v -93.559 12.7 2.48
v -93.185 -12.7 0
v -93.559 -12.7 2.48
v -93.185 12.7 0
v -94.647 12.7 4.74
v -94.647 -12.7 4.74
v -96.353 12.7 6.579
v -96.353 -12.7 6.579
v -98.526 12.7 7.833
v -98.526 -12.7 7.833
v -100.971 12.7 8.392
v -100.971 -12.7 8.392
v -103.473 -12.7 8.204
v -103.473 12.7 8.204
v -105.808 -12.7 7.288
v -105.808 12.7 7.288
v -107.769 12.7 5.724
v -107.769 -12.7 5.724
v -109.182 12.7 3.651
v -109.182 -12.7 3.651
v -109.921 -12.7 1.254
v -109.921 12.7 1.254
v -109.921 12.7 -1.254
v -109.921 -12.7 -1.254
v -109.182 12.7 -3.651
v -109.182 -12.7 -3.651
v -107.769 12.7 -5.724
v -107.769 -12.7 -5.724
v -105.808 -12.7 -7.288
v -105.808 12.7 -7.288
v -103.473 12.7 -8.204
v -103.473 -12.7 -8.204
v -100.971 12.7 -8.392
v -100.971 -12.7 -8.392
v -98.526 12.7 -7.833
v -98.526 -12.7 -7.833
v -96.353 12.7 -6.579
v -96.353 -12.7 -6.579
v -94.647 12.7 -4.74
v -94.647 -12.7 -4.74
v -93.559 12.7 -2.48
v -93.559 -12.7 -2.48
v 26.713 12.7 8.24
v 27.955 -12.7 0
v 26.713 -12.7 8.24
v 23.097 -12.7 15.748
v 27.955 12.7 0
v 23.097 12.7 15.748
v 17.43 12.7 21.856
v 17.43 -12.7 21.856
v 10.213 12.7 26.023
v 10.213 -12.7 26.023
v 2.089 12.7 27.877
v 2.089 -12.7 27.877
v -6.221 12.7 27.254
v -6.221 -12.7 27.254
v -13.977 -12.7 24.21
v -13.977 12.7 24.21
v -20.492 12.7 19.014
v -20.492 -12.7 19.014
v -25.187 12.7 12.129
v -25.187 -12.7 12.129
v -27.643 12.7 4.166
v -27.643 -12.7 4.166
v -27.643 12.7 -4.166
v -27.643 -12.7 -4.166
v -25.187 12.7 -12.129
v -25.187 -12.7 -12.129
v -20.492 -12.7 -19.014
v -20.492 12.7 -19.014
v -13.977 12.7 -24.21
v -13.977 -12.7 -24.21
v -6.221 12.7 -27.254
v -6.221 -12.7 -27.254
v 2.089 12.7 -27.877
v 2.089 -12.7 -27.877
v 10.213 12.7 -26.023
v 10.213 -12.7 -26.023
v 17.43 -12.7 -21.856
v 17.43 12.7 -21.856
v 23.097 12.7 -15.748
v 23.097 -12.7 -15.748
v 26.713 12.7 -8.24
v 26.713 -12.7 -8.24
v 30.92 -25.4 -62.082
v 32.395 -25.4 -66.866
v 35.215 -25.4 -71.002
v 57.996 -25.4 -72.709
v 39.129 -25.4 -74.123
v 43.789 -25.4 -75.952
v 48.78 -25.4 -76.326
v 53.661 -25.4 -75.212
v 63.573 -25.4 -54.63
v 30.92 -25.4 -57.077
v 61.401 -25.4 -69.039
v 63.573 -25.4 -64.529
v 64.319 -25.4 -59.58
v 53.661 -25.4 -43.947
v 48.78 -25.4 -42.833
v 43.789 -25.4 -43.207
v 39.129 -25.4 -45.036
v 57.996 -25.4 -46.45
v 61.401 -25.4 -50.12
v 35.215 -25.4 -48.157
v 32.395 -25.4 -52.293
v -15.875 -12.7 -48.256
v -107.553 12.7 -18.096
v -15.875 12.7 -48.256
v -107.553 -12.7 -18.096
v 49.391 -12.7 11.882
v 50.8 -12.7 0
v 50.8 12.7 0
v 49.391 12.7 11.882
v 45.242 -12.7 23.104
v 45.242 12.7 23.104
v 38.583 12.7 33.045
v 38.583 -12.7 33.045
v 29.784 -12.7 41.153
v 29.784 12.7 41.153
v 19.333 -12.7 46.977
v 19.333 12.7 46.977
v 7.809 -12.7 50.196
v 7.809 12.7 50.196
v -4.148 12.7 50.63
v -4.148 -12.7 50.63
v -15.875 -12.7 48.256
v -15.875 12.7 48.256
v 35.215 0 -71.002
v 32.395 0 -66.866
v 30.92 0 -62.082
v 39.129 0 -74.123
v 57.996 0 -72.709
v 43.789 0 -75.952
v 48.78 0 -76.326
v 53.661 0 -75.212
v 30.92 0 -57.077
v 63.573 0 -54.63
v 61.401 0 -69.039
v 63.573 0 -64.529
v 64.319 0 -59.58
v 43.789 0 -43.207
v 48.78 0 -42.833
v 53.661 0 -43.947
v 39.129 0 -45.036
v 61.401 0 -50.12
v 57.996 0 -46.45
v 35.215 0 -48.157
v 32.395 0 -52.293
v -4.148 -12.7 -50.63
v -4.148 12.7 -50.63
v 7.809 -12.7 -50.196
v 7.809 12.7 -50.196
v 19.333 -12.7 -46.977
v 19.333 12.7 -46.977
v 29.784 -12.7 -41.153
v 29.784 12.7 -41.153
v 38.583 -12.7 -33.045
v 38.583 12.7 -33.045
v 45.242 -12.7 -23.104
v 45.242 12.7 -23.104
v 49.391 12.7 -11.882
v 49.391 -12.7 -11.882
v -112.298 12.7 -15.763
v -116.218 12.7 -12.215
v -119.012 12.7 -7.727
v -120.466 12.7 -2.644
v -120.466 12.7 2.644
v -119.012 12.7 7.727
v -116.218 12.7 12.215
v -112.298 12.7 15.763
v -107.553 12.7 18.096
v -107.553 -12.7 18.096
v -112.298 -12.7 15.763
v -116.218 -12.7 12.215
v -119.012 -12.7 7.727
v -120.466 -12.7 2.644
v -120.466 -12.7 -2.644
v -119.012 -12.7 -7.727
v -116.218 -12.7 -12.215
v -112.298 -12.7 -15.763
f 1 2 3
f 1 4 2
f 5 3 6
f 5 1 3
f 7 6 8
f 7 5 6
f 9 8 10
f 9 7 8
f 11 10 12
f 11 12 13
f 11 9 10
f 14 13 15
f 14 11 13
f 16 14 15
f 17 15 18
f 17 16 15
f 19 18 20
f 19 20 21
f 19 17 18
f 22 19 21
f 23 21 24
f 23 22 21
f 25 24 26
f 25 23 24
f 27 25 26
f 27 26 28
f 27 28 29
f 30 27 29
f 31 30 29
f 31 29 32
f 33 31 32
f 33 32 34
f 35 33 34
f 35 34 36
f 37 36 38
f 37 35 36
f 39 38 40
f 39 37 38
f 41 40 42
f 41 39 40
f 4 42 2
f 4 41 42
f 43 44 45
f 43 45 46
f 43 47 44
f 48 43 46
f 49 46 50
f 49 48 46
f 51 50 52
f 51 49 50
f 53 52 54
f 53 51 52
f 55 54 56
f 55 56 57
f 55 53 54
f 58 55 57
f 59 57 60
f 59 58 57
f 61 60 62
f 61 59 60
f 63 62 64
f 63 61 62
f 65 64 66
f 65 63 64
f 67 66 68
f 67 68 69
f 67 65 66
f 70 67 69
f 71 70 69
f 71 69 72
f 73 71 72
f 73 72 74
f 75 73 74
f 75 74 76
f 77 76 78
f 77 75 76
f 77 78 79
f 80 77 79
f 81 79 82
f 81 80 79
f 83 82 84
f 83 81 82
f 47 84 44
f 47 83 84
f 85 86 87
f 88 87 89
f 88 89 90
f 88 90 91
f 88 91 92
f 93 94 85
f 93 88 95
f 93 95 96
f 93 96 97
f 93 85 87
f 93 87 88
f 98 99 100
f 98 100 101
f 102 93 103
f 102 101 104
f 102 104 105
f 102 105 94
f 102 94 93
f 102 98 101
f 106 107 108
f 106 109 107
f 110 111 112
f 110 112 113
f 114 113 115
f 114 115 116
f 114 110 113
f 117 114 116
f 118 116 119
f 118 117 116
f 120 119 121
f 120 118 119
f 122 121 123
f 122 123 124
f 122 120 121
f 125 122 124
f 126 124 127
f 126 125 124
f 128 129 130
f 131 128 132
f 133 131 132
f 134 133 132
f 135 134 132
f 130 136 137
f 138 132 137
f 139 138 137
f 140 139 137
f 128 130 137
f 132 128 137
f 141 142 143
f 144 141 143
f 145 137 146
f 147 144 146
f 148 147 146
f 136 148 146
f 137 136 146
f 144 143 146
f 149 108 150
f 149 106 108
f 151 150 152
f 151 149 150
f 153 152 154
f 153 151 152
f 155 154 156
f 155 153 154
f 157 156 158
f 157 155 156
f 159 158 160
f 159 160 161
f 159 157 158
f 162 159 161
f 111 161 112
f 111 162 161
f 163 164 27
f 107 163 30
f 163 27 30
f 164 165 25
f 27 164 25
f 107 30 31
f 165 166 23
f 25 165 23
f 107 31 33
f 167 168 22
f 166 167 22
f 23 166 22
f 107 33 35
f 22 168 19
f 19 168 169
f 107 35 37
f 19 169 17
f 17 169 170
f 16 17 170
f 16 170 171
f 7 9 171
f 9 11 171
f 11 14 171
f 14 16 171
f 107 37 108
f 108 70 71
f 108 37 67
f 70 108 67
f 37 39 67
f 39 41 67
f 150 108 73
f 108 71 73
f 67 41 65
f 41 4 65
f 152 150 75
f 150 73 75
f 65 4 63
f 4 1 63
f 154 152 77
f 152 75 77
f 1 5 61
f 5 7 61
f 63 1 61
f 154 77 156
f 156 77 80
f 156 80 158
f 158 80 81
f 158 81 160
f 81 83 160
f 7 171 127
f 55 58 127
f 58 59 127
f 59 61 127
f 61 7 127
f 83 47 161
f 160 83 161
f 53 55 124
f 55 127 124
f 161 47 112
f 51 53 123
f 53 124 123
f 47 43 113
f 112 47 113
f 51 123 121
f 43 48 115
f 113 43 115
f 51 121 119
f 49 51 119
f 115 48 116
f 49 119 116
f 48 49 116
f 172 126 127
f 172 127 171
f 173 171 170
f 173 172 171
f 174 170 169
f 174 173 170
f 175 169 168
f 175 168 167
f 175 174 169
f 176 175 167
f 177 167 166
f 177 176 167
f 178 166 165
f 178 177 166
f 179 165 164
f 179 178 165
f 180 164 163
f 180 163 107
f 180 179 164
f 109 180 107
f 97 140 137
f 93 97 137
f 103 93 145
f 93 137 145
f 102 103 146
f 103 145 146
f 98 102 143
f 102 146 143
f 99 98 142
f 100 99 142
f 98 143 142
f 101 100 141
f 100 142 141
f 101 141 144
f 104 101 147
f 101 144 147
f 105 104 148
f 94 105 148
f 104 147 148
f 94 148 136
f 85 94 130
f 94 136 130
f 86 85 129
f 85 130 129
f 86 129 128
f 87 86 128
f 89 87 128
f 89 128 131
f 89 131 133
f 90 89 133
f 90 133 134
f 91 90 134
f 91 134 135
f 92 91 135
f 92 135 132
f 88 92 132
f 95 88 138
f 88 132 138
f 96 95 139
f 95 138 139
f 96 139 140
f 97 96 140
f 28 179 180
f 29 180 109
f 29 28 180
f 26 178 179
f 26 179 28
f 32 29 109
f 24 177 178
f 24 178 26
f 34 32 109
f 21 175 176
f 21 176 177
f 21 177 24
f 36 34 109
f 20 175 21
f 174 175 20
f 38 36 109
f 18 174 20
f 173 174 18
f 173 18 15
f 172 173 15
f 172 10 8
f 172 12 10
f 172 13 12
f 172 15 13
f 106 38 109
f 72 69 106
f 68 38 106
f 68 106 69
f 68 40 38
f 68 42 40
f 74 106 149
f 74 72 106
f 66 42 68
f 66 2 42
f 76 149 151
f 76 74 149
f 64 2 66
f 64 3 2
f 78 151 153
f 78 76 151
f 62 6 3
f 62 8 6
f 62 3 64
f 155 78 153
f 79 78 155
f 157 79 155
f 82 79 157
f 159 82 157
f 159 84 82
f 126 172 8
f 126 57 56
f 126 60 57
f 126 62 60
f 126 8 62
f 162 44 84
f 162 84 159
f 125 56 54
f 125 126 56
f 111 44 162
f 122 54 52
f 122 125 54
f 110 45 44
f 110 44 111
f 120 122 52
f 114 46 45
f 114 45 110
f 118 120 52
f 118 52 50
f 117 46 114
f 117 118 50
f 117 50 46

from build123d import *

# Parameters (mm, degrees)
F1_R     = 16.793149
F2_DEPTH = 25.4
F0_R     = 27.954937
F0_R_2   = 8.415147
F3_DEPTH = 12.7


with BuildPart() as f2:
    # F1 (on Front) → F2 (new body)
    with BuildSketch(Plane.XZ):
        with Locations((47.525447, -59.579577)):
            Circle(F1_R)
    extrude(amount=F2_DEPTH)


with BuildPart() as f3:
    # F0 (on Front) → F3 (new body, symmetric)
    with BuildSketch(Plane.XZ):
        with BuildLine():
            ThreePointArc((-15.875, -48.255822), (29.78414, -41.152703), (50.8, 0))
            ThreePointArc((50.8, 0), (29.78414, 41.152703), (-15.875, 48.255822))
            ThreePointArc((-15.875, 48.255822), (-50.8, 0), (-15.875, -48.255822))
        make_face()
        Circle(F0_R, mode=Mode.SUBTRACT)
        with BuildLine():
            ThreePointArc((-15.875, -48.255822), (-50.8, 0), (-15.875, 48.255822))
            Line((-15.875, 48.255822), (-107.553125, 18.095933))
            ThreePointArc((-107.553125, 18.095933), (-90.430947, 15.432264), (-82.55, 0))
            ThreePointArc((-82.55, 0), (-90.430947, -15.432264), (-107.553125, -18.095933))
            Line((-107.553125, -18.095933), (-15.875, -48.255822))
        make_face()
        with BuildLine():
            ThreePointArc((-82.55, 0), (-90.430947, 15.432264), (-107.553125, 18.095933))
            ThreePointArc((-107.553125, 18.095933), (-120.65, 0), (-107.553125, -18.095933))
            ThreePointArc((-107.553125, -18.095933), (-90.430947, -15.432264), (-82.55, 0))
        make_face()
        with Locations((-101.6, 0)):
            Circle(F0_R_2, mode=Mode.SUBTRACT)
    extrude(amount=F3_DEPTH, both=True)


solid = Compound([f2.part, f3.part])
